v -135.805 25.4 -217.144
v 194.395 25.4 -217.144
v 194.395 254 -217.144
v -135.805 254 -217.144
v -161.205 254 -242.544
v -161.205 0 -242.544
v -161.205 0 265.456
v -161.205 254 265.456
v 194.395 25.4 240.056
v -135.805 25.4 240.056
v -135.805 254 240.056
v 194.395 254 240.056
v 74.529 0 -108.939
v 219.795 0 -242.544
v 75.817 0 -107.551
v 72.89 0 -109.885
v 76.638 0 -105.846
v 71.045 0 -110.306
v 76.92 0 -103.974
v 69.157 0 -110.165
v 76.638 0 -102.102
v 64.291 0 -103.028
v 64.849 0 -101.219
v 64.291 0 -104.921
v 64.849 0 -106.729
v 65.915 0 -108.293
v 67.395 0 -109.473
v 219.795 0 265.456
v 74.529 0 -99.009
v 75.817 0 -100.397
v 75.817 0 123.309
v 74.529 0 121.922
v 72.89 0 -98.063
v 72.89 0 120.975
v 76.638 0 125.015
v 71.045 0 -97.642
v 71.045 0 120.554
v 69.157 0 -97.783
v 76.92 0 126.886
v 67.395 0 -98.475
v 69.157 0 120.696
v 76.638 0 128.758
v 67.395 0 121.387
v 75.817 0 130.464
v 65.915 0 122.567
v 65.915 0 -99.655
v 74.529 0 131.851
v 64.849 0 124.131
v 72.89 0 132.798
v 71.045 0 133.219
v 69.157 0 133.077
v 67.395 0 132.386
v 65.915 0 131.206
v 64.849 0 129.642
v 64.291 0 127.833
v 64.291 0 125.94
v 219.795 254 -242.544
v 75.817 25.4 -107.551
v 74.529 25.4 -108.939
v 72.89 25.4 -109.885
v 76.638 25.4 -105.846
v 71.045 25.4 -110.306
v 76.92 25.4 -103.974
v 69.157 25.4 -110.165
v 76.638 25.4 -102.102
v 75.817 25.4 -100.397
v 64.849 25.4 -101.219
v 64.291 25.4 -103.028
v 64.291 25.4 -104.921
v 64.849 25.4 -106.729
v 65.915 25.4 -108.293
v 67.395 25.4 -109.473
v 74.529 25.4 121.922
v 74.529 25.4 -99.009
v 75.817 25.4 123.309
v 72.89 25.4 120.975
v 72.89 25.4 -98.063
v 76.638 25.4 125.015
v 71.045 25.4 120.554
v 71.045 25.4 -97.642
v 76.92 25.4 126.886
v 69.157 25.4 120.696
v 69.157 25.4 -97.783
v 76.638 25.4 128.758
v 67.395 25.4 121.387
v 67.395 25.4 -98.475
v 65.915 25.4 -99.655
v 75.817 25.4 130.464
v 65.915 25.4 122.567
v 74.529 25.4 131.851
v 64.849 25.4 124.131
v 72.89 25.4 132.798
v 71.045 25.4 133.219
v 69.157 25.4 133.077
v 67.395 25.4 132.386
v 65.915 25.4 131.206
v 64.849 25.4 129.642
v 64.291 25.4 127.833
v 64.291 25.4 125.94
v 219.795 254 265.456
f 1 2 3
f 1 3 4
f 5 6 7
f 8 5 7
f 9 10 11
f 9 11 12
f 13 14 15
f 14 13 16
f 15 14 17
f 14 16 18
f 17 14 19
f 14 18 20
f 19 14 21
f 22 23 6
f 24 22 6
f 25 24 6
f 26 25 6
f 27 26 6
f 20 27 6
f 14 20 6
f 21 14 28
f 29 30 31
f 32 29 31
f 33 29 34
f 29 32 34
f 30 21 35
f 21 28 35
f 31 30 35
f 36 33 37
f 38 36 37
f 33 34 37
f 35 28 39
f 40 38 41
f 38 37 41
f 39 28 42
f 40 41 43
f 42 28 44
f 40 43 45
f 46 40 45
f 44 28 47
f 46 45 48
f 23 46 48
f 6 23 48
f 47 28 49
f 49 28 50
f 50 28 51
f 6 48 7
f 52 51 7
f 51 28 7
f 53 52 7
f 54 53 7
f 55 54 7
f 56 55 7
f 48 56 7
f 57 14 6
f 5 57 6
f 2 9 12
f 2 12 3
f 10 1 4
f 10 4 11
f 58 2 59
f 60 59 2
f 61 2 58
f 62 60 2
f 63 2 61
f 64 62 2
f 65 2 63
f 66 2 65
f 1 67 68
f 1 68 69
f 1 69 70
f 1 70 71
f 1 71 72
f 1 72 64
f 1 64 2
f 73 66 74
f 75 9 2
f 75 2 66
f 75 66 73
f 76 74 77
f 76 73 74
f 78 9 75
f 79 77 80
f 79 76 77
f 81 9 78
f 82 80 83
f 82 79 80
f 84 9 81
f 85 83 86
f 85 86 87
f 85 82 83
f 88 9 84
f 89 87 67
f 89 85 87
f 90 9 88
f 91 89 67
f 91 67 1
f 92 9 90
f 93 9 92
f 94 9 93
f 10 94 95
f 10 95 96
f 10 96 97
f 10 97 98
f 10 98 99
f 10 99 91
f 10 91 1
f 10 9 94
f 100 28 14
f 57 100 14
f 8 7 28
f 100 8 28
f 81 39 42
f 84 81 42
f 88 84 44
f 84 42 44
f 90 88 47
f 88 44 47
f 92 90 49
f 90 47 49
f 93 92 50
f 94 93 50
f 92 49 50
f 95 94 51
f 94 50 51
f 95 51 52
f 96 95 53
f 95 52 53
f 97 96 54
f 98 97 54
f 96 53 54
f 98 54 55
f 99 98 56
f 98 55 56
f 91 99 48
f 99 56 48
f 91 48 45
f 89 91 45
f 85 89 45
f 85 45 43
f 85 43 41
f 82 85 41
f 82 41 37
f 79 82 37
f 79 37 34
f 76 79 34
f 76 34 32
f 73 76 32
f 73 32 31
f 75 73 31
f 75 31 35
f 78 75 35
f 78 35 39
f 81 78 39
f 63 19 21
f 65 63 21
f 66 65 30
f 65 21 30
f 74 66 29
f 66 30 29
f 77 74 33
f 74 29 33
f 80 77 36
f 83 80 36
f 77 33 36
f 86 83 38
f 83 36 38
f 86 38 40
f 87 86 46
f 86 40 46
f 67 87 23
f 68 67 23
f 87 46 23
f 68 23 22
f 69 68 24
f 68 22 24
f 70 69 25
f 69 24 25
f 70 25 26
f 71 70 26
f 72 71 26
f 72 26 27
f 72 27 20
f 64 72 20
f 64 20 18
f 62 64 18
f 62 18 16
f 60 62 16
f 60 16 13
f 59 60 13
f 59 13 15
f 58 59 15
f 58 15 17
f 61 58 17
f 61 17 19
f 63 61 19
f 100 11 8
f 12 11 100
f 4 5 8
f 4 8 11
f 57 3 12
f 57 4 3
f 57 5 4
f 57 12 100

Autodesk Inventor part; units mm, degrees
ref_plane "YZ Plane" through (0, 0, 0) normal (1, 0, 0) x (0, 1, 0)
ref_plane "XZ Plane" through (0, 0, 0) normal (0, 1, 0) x (-1, 0, 0)
ref_plane "XY Plane" through (0, 0, 0) normal (0, 0, 1) x (1, 0, 0)
sketch "Sketch1" plane through (0, 0, 0) normal (0, 1, 0) x (-1, 0, 0)
  line L0 (161.2049, 265.4562) -> (-219.7951, 265.4562)
  line L1 (-219.7951, 265.4562) -> (-219.7951, -242.5438)
  line L2 (-219.7951, -242.5438) -> (161.2049, -242.5438)
  line L3 (161.2049, -242.5438) -> (161.2049, 265.4562)
  point P0 (0, 0)
  dimension "d0" = 508
  dimension "d1" = 381
extrude "Extrusion1" add sketch "Sketch1" along normal blind 25.4
sketch "Sketch2" plane through (0, 25.4, 0) normal (0, 1, 0) x (1, 0, 0)
  line L0 (-161.2049, -265.4562) -> (219.7951, -265.4562) projected
  line L1 (219.7951, -265.4562) -> (-161.2049, -265.4562)
  line L2 (-161.2049, 242.5438) -> (-161.2049, -265.4562) projected
  line L3 (-161.2049, -265.4562) -> (-161.2049, 242.5438)
  line L4 (219.7951, -265.4562) -> (219.7951, 242.5438) projected
  line L5 (-161.2049, 242.5438) -> (219.7951, 242.5438)
  line L6 (219.7951, 242.5438) -> (219.7951, -265.4562)
  line L7 (219.7951, -265.4562) -> (-161.2049, -265.4562)
  line L8 (219.7951, 242.5438) -> (-161.2049, 242.5438) projected
  line L9 (-161.2049, 242.5438) -> (219.7951, 242.5438)
  line L10 (-135.8049, -240.0562) -> (194.3951, -240.0562)
  line L11 (194.3951, -240.0562) -> (194.3951, 217.1438)
  line L12 (194.3951, 217.1438) -> (-135.8049, 217.1438)
  line L13 (-135.8049, 217.1438) -> (-135.8049, -240.0562)
  point P0 (0, 0)
  dimension "d4" = 25.4
extrude "Extrusion2" add sketch "Sketch2" along normal blind 228.6
sketch "Sketch4" plane through (0, 0, 0) normal (0, -1, 0) x (1, 0, 0)
  line L0 (-161.2049, 265.4562) -> (219.7951, 265.4562) construction
  line L1 (70.5701, 265.4562) -> (70.5701, -242.5438) construction
  line L2 (219.7951, -242.5438) -> (-161.2049, -242.5438) construction
  line L3 (219.7951, 265.4562) -> (219.7951, -242.5438) construction
  circle A0 centre (70.5701, 126.8865) radius 6.35
  circle A1 centre (70.5701, -103.9741) radius 6.35
  line L4 (-161.2049, -242.5438) -> (-161.2049, 265.4562) construction
  line L5 (-161.2049, 11.4562) -> (219.7951, 11.4562) construction
  point P0 (0, 0)
  dimension "d8" = 149.225
  dimension "d9" = 12.7
  dimension "d14" = 138.5697
  dimension "d15" = 138.5697
extrude "Extrusion3" cut sketch "Sketch4" against normal through all
equation "\"d14\" = d11"
equation "\"d11\" = d10"
equation "\"d10\" = 138.5697"
properties part number "Battery Bucket"
